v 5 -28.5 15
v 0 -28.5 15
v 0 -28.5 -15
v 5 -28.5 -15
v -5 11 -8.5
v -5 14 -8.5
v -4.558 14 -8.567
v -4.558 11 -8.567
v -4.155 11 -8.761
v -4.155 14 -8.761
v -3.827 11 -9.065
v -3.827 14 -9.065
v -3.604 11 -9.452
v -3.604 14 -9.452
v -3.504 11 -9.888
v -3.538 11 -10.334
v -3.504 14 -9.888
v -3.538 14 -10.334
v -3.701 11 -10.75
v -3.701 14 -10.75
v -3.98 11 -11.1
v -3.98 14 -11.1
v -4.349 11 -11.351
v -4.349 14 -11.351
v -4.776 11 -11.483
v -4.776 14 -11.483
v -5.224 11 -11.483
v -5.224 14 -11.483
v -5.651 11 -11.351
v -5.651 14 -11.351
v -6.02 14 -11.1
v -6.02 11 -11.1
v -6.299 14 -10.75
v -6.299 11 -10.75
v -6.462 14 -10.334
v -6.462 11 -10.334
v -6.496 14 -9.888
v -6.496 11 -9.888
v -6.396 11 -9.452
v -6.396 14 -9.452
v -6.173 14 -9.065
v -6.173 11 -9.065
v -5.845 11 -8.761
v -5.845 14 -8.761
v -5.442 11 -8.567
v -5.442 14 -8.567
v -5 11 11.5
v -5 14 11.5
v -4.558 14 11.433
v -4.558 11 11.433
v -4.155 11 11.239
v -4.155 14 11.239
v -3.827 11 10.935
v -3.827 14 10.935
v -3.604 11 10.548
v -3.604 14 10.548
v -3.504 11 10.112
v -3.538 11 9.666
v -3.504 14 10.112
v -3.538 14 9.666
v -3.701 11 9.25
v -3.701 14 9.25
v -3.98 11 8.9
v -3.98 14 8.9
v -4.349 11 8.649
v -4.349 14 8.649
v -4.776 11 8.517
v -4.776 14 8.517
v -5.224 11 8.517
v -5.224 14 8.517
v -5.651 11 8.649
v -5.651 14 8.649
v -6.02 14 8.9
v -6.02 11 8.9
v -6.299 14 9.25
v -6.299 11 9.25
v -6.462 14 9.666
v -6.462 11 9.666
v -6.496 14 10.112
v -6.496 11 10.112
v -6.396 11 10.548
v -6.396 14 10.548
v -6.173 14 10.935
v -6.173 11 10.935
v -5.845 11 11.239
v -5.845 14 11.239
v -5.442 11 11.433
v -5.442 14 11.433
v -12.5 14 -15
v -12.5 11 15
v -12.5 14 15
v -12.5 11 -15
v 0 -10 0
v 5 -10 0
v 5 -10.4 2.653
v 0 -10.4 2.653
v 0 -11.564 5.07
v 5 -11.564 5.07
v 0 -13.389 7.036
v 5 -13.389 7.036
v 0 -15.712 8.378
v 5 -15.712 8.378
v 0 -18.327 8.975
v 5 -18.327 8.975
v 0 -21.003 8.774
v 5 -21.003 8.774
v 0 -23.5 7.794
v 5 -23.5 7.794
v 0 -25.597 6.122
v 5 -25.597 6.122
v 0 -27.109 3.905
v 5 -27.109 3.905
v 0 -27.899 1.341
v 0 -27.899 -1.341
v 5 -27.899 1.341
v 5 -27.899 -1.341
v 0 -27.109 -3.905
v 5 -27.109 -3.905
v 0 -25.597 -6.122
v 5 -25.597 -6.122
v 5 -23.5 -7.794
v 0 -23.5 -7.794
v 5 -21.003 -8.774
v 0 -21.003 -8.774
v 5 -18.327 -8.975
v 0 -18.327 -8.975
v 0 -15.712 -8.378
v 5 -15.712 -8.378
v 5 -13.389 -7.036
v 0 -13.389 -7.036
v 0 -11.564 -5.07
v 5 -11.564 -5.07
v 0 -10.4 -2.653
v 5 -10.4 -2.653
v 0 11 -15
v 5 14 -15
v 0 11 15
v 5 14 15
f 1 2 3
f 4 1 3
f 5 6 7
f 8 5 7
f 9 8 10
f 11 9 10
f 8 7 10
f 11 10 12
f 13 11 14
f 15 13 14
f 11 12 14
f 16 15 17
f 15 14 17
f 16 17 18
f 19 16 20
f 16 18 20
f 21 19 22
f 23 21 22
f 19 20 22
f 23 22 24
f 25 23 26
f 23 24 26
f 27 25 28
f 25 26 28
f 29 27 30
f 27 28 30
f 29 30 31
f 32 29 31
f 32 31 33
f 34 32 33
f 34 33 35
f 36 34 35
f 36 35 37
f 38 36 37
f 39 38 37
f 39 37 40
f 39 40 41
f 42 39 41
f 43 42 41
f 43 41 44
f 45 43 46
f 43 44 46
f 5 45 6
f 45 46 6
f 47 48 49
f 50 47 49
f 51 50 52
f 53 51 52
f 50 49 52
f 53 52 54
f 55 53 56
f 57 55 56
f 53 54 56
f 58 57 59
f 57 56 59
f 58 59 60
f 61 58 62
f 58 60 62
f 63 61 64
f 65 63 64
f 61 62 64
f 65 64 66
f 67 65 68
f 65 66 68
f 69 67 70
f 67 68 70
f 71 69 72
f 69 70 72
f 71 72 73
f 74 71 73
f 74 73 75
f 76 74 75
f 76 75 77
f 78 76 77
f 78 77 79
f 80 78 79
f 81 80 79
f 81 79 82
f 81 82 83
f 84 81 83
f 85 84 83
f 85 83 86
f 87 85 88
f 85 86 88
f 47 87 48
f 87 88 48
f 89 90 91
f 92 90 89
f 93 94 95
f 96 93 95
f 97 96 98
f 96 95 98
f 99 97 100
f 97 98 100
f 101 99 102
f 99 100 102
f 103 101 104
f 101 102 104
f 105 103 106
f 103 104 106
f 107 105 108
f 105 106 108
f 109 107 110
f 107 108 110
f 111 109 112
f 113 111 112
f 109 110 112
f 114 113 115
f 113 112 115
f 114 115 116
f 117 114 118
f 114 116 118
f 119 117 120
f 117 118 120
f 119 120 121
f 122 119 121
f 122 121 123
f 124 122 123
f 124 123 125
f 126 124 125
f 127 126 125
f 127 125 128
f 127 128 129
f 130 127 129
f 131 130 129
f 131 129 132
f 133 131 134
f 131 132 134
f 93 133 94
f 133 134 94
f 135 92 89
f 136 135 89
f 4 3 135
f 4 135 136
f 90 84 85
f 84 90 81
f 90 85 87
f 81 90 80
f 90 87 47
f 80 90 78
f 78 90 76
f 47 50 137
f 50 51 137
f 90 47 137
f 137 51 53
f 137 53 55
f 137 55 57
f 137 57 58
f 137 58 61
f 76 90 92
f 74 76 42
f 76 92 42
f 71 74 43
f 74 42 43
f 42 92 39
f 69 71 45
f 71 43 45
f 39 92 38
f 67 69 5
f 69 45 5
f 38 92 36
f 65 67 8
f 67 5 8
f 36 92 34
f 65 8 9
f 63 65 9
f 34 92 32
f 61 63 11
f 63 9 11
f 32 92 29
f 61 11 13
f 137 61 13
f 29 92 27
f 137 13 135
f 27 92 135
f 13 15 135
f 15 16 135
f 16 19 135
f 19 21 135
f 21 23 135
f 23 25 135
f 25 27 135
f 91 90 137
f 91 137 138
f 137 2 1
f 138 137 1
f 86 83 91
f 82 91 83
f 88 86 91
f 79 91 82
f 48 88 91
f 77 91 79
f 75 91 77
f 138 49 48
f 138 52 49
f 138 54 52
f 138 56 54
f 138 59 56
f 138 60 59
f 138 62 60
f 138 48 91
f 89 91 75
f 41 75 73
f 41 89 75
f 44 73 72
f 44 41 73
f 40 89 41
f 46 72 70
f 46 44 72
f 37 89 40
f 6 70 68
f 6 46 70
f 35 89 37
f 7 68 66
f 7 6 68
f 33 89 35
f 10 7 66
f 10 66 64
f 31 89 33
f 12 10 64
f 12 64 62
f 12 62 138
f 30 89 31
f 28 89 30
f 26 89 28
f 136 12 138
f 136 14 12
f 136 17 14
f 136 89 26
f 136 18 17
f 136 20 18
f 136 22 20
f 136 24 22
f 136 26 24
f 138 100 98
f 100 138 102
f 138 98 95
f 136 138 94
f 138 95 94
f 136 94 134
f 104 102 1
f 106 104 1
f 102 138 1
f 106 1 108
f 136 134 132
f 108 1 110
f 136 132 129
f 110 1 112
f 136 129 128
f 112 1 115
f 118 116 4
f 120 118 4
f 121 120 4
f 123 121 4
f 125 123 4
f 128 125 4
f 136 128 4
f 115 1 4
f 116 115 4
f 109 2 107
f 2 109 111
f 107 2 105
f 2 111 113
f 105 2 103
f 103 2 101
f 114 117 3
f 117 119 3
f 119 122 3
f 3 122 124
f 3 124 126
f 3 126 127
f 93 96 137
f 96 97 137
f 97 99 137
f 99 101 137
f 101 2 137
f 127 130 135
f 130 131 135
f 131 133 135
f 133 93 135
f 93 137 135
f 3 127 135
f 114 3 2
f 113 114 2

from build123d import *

# Parameters (mm, degrees)
SKETCH_1_W          = 30
SKETCH_1_H          = 39.5
EXTRUDE_1_DEPTH     = 5
SKETCH_2_R          = 9
CUT_EXTRUDE_1_DEPTH = 5
SKETCH_3_W          = 17.5
SKETCH_3_H          = 30
EXTRUDE_2_DEPTH     = 3
SKETCH_6_R          = 1.5
CUT_EXTRUDE_2_DEPTH = 3


with BuildPart() as part:
    # 草图1 → 凸台-拉伸1 (new body)
    with BuildSketch(Plane(origin=(0, 0, 0), x_dir=(0, 0, -1), z_dir=(1, 0, 0))):
        with Locations((0, -8.75)):
            Rectangle(SKETCH_1_W, SKETCH_1_H)
    extrude(amount=EXTRUDE_1_DEPTH)

    # 草图2 → 切除-拉伸1 (cut)
    with BuildSketch(Plane(origin=(5, 0, 0), x_dir=(0, 0, -1), z_dir=(1, 0, 0))):
        with Locations(Location((0, -19, 0), (0, 0, 90))):
            Circle(SKETCH_2_R)
    extrude(amount=-CUT_EXTRUDE_1_DEPTH, mode=Mode.SUBTRACT)

    # 草图3 → 凸台-拉伸2 (add)
    with BuildSketch(Plane(origin=(0, 11, 0), x_dir=(1, 0, 0), z_dir=(0, 1, 0))):
        with Locations((-3.75, 0)):
            Rectangle(SKETCH_3_W, SKETCH_3_H)
    extrude(amount=EXTRUDE_2_DEPTH)

    # 草图6 → 切除-拉伸2 (cut)
    with BuildSketch(Plane(origin=(0, 14, 0), x_dir=(1, 0, 0), z_dir=(0, 1, 0))):
        with Locations(Location((-5, 10, 0), (0, 0, 270))):
            Circle(SKETCH_6_R)
        with Locations(Location((-5, -10, 0), (0, 0, 270))):
            Circle(SKETCH_6_R)
    extrude(amount=-CUT_EXTRUDE_2_DEPTH, mode=Mode.SUBTRACT)


solid = part.part
